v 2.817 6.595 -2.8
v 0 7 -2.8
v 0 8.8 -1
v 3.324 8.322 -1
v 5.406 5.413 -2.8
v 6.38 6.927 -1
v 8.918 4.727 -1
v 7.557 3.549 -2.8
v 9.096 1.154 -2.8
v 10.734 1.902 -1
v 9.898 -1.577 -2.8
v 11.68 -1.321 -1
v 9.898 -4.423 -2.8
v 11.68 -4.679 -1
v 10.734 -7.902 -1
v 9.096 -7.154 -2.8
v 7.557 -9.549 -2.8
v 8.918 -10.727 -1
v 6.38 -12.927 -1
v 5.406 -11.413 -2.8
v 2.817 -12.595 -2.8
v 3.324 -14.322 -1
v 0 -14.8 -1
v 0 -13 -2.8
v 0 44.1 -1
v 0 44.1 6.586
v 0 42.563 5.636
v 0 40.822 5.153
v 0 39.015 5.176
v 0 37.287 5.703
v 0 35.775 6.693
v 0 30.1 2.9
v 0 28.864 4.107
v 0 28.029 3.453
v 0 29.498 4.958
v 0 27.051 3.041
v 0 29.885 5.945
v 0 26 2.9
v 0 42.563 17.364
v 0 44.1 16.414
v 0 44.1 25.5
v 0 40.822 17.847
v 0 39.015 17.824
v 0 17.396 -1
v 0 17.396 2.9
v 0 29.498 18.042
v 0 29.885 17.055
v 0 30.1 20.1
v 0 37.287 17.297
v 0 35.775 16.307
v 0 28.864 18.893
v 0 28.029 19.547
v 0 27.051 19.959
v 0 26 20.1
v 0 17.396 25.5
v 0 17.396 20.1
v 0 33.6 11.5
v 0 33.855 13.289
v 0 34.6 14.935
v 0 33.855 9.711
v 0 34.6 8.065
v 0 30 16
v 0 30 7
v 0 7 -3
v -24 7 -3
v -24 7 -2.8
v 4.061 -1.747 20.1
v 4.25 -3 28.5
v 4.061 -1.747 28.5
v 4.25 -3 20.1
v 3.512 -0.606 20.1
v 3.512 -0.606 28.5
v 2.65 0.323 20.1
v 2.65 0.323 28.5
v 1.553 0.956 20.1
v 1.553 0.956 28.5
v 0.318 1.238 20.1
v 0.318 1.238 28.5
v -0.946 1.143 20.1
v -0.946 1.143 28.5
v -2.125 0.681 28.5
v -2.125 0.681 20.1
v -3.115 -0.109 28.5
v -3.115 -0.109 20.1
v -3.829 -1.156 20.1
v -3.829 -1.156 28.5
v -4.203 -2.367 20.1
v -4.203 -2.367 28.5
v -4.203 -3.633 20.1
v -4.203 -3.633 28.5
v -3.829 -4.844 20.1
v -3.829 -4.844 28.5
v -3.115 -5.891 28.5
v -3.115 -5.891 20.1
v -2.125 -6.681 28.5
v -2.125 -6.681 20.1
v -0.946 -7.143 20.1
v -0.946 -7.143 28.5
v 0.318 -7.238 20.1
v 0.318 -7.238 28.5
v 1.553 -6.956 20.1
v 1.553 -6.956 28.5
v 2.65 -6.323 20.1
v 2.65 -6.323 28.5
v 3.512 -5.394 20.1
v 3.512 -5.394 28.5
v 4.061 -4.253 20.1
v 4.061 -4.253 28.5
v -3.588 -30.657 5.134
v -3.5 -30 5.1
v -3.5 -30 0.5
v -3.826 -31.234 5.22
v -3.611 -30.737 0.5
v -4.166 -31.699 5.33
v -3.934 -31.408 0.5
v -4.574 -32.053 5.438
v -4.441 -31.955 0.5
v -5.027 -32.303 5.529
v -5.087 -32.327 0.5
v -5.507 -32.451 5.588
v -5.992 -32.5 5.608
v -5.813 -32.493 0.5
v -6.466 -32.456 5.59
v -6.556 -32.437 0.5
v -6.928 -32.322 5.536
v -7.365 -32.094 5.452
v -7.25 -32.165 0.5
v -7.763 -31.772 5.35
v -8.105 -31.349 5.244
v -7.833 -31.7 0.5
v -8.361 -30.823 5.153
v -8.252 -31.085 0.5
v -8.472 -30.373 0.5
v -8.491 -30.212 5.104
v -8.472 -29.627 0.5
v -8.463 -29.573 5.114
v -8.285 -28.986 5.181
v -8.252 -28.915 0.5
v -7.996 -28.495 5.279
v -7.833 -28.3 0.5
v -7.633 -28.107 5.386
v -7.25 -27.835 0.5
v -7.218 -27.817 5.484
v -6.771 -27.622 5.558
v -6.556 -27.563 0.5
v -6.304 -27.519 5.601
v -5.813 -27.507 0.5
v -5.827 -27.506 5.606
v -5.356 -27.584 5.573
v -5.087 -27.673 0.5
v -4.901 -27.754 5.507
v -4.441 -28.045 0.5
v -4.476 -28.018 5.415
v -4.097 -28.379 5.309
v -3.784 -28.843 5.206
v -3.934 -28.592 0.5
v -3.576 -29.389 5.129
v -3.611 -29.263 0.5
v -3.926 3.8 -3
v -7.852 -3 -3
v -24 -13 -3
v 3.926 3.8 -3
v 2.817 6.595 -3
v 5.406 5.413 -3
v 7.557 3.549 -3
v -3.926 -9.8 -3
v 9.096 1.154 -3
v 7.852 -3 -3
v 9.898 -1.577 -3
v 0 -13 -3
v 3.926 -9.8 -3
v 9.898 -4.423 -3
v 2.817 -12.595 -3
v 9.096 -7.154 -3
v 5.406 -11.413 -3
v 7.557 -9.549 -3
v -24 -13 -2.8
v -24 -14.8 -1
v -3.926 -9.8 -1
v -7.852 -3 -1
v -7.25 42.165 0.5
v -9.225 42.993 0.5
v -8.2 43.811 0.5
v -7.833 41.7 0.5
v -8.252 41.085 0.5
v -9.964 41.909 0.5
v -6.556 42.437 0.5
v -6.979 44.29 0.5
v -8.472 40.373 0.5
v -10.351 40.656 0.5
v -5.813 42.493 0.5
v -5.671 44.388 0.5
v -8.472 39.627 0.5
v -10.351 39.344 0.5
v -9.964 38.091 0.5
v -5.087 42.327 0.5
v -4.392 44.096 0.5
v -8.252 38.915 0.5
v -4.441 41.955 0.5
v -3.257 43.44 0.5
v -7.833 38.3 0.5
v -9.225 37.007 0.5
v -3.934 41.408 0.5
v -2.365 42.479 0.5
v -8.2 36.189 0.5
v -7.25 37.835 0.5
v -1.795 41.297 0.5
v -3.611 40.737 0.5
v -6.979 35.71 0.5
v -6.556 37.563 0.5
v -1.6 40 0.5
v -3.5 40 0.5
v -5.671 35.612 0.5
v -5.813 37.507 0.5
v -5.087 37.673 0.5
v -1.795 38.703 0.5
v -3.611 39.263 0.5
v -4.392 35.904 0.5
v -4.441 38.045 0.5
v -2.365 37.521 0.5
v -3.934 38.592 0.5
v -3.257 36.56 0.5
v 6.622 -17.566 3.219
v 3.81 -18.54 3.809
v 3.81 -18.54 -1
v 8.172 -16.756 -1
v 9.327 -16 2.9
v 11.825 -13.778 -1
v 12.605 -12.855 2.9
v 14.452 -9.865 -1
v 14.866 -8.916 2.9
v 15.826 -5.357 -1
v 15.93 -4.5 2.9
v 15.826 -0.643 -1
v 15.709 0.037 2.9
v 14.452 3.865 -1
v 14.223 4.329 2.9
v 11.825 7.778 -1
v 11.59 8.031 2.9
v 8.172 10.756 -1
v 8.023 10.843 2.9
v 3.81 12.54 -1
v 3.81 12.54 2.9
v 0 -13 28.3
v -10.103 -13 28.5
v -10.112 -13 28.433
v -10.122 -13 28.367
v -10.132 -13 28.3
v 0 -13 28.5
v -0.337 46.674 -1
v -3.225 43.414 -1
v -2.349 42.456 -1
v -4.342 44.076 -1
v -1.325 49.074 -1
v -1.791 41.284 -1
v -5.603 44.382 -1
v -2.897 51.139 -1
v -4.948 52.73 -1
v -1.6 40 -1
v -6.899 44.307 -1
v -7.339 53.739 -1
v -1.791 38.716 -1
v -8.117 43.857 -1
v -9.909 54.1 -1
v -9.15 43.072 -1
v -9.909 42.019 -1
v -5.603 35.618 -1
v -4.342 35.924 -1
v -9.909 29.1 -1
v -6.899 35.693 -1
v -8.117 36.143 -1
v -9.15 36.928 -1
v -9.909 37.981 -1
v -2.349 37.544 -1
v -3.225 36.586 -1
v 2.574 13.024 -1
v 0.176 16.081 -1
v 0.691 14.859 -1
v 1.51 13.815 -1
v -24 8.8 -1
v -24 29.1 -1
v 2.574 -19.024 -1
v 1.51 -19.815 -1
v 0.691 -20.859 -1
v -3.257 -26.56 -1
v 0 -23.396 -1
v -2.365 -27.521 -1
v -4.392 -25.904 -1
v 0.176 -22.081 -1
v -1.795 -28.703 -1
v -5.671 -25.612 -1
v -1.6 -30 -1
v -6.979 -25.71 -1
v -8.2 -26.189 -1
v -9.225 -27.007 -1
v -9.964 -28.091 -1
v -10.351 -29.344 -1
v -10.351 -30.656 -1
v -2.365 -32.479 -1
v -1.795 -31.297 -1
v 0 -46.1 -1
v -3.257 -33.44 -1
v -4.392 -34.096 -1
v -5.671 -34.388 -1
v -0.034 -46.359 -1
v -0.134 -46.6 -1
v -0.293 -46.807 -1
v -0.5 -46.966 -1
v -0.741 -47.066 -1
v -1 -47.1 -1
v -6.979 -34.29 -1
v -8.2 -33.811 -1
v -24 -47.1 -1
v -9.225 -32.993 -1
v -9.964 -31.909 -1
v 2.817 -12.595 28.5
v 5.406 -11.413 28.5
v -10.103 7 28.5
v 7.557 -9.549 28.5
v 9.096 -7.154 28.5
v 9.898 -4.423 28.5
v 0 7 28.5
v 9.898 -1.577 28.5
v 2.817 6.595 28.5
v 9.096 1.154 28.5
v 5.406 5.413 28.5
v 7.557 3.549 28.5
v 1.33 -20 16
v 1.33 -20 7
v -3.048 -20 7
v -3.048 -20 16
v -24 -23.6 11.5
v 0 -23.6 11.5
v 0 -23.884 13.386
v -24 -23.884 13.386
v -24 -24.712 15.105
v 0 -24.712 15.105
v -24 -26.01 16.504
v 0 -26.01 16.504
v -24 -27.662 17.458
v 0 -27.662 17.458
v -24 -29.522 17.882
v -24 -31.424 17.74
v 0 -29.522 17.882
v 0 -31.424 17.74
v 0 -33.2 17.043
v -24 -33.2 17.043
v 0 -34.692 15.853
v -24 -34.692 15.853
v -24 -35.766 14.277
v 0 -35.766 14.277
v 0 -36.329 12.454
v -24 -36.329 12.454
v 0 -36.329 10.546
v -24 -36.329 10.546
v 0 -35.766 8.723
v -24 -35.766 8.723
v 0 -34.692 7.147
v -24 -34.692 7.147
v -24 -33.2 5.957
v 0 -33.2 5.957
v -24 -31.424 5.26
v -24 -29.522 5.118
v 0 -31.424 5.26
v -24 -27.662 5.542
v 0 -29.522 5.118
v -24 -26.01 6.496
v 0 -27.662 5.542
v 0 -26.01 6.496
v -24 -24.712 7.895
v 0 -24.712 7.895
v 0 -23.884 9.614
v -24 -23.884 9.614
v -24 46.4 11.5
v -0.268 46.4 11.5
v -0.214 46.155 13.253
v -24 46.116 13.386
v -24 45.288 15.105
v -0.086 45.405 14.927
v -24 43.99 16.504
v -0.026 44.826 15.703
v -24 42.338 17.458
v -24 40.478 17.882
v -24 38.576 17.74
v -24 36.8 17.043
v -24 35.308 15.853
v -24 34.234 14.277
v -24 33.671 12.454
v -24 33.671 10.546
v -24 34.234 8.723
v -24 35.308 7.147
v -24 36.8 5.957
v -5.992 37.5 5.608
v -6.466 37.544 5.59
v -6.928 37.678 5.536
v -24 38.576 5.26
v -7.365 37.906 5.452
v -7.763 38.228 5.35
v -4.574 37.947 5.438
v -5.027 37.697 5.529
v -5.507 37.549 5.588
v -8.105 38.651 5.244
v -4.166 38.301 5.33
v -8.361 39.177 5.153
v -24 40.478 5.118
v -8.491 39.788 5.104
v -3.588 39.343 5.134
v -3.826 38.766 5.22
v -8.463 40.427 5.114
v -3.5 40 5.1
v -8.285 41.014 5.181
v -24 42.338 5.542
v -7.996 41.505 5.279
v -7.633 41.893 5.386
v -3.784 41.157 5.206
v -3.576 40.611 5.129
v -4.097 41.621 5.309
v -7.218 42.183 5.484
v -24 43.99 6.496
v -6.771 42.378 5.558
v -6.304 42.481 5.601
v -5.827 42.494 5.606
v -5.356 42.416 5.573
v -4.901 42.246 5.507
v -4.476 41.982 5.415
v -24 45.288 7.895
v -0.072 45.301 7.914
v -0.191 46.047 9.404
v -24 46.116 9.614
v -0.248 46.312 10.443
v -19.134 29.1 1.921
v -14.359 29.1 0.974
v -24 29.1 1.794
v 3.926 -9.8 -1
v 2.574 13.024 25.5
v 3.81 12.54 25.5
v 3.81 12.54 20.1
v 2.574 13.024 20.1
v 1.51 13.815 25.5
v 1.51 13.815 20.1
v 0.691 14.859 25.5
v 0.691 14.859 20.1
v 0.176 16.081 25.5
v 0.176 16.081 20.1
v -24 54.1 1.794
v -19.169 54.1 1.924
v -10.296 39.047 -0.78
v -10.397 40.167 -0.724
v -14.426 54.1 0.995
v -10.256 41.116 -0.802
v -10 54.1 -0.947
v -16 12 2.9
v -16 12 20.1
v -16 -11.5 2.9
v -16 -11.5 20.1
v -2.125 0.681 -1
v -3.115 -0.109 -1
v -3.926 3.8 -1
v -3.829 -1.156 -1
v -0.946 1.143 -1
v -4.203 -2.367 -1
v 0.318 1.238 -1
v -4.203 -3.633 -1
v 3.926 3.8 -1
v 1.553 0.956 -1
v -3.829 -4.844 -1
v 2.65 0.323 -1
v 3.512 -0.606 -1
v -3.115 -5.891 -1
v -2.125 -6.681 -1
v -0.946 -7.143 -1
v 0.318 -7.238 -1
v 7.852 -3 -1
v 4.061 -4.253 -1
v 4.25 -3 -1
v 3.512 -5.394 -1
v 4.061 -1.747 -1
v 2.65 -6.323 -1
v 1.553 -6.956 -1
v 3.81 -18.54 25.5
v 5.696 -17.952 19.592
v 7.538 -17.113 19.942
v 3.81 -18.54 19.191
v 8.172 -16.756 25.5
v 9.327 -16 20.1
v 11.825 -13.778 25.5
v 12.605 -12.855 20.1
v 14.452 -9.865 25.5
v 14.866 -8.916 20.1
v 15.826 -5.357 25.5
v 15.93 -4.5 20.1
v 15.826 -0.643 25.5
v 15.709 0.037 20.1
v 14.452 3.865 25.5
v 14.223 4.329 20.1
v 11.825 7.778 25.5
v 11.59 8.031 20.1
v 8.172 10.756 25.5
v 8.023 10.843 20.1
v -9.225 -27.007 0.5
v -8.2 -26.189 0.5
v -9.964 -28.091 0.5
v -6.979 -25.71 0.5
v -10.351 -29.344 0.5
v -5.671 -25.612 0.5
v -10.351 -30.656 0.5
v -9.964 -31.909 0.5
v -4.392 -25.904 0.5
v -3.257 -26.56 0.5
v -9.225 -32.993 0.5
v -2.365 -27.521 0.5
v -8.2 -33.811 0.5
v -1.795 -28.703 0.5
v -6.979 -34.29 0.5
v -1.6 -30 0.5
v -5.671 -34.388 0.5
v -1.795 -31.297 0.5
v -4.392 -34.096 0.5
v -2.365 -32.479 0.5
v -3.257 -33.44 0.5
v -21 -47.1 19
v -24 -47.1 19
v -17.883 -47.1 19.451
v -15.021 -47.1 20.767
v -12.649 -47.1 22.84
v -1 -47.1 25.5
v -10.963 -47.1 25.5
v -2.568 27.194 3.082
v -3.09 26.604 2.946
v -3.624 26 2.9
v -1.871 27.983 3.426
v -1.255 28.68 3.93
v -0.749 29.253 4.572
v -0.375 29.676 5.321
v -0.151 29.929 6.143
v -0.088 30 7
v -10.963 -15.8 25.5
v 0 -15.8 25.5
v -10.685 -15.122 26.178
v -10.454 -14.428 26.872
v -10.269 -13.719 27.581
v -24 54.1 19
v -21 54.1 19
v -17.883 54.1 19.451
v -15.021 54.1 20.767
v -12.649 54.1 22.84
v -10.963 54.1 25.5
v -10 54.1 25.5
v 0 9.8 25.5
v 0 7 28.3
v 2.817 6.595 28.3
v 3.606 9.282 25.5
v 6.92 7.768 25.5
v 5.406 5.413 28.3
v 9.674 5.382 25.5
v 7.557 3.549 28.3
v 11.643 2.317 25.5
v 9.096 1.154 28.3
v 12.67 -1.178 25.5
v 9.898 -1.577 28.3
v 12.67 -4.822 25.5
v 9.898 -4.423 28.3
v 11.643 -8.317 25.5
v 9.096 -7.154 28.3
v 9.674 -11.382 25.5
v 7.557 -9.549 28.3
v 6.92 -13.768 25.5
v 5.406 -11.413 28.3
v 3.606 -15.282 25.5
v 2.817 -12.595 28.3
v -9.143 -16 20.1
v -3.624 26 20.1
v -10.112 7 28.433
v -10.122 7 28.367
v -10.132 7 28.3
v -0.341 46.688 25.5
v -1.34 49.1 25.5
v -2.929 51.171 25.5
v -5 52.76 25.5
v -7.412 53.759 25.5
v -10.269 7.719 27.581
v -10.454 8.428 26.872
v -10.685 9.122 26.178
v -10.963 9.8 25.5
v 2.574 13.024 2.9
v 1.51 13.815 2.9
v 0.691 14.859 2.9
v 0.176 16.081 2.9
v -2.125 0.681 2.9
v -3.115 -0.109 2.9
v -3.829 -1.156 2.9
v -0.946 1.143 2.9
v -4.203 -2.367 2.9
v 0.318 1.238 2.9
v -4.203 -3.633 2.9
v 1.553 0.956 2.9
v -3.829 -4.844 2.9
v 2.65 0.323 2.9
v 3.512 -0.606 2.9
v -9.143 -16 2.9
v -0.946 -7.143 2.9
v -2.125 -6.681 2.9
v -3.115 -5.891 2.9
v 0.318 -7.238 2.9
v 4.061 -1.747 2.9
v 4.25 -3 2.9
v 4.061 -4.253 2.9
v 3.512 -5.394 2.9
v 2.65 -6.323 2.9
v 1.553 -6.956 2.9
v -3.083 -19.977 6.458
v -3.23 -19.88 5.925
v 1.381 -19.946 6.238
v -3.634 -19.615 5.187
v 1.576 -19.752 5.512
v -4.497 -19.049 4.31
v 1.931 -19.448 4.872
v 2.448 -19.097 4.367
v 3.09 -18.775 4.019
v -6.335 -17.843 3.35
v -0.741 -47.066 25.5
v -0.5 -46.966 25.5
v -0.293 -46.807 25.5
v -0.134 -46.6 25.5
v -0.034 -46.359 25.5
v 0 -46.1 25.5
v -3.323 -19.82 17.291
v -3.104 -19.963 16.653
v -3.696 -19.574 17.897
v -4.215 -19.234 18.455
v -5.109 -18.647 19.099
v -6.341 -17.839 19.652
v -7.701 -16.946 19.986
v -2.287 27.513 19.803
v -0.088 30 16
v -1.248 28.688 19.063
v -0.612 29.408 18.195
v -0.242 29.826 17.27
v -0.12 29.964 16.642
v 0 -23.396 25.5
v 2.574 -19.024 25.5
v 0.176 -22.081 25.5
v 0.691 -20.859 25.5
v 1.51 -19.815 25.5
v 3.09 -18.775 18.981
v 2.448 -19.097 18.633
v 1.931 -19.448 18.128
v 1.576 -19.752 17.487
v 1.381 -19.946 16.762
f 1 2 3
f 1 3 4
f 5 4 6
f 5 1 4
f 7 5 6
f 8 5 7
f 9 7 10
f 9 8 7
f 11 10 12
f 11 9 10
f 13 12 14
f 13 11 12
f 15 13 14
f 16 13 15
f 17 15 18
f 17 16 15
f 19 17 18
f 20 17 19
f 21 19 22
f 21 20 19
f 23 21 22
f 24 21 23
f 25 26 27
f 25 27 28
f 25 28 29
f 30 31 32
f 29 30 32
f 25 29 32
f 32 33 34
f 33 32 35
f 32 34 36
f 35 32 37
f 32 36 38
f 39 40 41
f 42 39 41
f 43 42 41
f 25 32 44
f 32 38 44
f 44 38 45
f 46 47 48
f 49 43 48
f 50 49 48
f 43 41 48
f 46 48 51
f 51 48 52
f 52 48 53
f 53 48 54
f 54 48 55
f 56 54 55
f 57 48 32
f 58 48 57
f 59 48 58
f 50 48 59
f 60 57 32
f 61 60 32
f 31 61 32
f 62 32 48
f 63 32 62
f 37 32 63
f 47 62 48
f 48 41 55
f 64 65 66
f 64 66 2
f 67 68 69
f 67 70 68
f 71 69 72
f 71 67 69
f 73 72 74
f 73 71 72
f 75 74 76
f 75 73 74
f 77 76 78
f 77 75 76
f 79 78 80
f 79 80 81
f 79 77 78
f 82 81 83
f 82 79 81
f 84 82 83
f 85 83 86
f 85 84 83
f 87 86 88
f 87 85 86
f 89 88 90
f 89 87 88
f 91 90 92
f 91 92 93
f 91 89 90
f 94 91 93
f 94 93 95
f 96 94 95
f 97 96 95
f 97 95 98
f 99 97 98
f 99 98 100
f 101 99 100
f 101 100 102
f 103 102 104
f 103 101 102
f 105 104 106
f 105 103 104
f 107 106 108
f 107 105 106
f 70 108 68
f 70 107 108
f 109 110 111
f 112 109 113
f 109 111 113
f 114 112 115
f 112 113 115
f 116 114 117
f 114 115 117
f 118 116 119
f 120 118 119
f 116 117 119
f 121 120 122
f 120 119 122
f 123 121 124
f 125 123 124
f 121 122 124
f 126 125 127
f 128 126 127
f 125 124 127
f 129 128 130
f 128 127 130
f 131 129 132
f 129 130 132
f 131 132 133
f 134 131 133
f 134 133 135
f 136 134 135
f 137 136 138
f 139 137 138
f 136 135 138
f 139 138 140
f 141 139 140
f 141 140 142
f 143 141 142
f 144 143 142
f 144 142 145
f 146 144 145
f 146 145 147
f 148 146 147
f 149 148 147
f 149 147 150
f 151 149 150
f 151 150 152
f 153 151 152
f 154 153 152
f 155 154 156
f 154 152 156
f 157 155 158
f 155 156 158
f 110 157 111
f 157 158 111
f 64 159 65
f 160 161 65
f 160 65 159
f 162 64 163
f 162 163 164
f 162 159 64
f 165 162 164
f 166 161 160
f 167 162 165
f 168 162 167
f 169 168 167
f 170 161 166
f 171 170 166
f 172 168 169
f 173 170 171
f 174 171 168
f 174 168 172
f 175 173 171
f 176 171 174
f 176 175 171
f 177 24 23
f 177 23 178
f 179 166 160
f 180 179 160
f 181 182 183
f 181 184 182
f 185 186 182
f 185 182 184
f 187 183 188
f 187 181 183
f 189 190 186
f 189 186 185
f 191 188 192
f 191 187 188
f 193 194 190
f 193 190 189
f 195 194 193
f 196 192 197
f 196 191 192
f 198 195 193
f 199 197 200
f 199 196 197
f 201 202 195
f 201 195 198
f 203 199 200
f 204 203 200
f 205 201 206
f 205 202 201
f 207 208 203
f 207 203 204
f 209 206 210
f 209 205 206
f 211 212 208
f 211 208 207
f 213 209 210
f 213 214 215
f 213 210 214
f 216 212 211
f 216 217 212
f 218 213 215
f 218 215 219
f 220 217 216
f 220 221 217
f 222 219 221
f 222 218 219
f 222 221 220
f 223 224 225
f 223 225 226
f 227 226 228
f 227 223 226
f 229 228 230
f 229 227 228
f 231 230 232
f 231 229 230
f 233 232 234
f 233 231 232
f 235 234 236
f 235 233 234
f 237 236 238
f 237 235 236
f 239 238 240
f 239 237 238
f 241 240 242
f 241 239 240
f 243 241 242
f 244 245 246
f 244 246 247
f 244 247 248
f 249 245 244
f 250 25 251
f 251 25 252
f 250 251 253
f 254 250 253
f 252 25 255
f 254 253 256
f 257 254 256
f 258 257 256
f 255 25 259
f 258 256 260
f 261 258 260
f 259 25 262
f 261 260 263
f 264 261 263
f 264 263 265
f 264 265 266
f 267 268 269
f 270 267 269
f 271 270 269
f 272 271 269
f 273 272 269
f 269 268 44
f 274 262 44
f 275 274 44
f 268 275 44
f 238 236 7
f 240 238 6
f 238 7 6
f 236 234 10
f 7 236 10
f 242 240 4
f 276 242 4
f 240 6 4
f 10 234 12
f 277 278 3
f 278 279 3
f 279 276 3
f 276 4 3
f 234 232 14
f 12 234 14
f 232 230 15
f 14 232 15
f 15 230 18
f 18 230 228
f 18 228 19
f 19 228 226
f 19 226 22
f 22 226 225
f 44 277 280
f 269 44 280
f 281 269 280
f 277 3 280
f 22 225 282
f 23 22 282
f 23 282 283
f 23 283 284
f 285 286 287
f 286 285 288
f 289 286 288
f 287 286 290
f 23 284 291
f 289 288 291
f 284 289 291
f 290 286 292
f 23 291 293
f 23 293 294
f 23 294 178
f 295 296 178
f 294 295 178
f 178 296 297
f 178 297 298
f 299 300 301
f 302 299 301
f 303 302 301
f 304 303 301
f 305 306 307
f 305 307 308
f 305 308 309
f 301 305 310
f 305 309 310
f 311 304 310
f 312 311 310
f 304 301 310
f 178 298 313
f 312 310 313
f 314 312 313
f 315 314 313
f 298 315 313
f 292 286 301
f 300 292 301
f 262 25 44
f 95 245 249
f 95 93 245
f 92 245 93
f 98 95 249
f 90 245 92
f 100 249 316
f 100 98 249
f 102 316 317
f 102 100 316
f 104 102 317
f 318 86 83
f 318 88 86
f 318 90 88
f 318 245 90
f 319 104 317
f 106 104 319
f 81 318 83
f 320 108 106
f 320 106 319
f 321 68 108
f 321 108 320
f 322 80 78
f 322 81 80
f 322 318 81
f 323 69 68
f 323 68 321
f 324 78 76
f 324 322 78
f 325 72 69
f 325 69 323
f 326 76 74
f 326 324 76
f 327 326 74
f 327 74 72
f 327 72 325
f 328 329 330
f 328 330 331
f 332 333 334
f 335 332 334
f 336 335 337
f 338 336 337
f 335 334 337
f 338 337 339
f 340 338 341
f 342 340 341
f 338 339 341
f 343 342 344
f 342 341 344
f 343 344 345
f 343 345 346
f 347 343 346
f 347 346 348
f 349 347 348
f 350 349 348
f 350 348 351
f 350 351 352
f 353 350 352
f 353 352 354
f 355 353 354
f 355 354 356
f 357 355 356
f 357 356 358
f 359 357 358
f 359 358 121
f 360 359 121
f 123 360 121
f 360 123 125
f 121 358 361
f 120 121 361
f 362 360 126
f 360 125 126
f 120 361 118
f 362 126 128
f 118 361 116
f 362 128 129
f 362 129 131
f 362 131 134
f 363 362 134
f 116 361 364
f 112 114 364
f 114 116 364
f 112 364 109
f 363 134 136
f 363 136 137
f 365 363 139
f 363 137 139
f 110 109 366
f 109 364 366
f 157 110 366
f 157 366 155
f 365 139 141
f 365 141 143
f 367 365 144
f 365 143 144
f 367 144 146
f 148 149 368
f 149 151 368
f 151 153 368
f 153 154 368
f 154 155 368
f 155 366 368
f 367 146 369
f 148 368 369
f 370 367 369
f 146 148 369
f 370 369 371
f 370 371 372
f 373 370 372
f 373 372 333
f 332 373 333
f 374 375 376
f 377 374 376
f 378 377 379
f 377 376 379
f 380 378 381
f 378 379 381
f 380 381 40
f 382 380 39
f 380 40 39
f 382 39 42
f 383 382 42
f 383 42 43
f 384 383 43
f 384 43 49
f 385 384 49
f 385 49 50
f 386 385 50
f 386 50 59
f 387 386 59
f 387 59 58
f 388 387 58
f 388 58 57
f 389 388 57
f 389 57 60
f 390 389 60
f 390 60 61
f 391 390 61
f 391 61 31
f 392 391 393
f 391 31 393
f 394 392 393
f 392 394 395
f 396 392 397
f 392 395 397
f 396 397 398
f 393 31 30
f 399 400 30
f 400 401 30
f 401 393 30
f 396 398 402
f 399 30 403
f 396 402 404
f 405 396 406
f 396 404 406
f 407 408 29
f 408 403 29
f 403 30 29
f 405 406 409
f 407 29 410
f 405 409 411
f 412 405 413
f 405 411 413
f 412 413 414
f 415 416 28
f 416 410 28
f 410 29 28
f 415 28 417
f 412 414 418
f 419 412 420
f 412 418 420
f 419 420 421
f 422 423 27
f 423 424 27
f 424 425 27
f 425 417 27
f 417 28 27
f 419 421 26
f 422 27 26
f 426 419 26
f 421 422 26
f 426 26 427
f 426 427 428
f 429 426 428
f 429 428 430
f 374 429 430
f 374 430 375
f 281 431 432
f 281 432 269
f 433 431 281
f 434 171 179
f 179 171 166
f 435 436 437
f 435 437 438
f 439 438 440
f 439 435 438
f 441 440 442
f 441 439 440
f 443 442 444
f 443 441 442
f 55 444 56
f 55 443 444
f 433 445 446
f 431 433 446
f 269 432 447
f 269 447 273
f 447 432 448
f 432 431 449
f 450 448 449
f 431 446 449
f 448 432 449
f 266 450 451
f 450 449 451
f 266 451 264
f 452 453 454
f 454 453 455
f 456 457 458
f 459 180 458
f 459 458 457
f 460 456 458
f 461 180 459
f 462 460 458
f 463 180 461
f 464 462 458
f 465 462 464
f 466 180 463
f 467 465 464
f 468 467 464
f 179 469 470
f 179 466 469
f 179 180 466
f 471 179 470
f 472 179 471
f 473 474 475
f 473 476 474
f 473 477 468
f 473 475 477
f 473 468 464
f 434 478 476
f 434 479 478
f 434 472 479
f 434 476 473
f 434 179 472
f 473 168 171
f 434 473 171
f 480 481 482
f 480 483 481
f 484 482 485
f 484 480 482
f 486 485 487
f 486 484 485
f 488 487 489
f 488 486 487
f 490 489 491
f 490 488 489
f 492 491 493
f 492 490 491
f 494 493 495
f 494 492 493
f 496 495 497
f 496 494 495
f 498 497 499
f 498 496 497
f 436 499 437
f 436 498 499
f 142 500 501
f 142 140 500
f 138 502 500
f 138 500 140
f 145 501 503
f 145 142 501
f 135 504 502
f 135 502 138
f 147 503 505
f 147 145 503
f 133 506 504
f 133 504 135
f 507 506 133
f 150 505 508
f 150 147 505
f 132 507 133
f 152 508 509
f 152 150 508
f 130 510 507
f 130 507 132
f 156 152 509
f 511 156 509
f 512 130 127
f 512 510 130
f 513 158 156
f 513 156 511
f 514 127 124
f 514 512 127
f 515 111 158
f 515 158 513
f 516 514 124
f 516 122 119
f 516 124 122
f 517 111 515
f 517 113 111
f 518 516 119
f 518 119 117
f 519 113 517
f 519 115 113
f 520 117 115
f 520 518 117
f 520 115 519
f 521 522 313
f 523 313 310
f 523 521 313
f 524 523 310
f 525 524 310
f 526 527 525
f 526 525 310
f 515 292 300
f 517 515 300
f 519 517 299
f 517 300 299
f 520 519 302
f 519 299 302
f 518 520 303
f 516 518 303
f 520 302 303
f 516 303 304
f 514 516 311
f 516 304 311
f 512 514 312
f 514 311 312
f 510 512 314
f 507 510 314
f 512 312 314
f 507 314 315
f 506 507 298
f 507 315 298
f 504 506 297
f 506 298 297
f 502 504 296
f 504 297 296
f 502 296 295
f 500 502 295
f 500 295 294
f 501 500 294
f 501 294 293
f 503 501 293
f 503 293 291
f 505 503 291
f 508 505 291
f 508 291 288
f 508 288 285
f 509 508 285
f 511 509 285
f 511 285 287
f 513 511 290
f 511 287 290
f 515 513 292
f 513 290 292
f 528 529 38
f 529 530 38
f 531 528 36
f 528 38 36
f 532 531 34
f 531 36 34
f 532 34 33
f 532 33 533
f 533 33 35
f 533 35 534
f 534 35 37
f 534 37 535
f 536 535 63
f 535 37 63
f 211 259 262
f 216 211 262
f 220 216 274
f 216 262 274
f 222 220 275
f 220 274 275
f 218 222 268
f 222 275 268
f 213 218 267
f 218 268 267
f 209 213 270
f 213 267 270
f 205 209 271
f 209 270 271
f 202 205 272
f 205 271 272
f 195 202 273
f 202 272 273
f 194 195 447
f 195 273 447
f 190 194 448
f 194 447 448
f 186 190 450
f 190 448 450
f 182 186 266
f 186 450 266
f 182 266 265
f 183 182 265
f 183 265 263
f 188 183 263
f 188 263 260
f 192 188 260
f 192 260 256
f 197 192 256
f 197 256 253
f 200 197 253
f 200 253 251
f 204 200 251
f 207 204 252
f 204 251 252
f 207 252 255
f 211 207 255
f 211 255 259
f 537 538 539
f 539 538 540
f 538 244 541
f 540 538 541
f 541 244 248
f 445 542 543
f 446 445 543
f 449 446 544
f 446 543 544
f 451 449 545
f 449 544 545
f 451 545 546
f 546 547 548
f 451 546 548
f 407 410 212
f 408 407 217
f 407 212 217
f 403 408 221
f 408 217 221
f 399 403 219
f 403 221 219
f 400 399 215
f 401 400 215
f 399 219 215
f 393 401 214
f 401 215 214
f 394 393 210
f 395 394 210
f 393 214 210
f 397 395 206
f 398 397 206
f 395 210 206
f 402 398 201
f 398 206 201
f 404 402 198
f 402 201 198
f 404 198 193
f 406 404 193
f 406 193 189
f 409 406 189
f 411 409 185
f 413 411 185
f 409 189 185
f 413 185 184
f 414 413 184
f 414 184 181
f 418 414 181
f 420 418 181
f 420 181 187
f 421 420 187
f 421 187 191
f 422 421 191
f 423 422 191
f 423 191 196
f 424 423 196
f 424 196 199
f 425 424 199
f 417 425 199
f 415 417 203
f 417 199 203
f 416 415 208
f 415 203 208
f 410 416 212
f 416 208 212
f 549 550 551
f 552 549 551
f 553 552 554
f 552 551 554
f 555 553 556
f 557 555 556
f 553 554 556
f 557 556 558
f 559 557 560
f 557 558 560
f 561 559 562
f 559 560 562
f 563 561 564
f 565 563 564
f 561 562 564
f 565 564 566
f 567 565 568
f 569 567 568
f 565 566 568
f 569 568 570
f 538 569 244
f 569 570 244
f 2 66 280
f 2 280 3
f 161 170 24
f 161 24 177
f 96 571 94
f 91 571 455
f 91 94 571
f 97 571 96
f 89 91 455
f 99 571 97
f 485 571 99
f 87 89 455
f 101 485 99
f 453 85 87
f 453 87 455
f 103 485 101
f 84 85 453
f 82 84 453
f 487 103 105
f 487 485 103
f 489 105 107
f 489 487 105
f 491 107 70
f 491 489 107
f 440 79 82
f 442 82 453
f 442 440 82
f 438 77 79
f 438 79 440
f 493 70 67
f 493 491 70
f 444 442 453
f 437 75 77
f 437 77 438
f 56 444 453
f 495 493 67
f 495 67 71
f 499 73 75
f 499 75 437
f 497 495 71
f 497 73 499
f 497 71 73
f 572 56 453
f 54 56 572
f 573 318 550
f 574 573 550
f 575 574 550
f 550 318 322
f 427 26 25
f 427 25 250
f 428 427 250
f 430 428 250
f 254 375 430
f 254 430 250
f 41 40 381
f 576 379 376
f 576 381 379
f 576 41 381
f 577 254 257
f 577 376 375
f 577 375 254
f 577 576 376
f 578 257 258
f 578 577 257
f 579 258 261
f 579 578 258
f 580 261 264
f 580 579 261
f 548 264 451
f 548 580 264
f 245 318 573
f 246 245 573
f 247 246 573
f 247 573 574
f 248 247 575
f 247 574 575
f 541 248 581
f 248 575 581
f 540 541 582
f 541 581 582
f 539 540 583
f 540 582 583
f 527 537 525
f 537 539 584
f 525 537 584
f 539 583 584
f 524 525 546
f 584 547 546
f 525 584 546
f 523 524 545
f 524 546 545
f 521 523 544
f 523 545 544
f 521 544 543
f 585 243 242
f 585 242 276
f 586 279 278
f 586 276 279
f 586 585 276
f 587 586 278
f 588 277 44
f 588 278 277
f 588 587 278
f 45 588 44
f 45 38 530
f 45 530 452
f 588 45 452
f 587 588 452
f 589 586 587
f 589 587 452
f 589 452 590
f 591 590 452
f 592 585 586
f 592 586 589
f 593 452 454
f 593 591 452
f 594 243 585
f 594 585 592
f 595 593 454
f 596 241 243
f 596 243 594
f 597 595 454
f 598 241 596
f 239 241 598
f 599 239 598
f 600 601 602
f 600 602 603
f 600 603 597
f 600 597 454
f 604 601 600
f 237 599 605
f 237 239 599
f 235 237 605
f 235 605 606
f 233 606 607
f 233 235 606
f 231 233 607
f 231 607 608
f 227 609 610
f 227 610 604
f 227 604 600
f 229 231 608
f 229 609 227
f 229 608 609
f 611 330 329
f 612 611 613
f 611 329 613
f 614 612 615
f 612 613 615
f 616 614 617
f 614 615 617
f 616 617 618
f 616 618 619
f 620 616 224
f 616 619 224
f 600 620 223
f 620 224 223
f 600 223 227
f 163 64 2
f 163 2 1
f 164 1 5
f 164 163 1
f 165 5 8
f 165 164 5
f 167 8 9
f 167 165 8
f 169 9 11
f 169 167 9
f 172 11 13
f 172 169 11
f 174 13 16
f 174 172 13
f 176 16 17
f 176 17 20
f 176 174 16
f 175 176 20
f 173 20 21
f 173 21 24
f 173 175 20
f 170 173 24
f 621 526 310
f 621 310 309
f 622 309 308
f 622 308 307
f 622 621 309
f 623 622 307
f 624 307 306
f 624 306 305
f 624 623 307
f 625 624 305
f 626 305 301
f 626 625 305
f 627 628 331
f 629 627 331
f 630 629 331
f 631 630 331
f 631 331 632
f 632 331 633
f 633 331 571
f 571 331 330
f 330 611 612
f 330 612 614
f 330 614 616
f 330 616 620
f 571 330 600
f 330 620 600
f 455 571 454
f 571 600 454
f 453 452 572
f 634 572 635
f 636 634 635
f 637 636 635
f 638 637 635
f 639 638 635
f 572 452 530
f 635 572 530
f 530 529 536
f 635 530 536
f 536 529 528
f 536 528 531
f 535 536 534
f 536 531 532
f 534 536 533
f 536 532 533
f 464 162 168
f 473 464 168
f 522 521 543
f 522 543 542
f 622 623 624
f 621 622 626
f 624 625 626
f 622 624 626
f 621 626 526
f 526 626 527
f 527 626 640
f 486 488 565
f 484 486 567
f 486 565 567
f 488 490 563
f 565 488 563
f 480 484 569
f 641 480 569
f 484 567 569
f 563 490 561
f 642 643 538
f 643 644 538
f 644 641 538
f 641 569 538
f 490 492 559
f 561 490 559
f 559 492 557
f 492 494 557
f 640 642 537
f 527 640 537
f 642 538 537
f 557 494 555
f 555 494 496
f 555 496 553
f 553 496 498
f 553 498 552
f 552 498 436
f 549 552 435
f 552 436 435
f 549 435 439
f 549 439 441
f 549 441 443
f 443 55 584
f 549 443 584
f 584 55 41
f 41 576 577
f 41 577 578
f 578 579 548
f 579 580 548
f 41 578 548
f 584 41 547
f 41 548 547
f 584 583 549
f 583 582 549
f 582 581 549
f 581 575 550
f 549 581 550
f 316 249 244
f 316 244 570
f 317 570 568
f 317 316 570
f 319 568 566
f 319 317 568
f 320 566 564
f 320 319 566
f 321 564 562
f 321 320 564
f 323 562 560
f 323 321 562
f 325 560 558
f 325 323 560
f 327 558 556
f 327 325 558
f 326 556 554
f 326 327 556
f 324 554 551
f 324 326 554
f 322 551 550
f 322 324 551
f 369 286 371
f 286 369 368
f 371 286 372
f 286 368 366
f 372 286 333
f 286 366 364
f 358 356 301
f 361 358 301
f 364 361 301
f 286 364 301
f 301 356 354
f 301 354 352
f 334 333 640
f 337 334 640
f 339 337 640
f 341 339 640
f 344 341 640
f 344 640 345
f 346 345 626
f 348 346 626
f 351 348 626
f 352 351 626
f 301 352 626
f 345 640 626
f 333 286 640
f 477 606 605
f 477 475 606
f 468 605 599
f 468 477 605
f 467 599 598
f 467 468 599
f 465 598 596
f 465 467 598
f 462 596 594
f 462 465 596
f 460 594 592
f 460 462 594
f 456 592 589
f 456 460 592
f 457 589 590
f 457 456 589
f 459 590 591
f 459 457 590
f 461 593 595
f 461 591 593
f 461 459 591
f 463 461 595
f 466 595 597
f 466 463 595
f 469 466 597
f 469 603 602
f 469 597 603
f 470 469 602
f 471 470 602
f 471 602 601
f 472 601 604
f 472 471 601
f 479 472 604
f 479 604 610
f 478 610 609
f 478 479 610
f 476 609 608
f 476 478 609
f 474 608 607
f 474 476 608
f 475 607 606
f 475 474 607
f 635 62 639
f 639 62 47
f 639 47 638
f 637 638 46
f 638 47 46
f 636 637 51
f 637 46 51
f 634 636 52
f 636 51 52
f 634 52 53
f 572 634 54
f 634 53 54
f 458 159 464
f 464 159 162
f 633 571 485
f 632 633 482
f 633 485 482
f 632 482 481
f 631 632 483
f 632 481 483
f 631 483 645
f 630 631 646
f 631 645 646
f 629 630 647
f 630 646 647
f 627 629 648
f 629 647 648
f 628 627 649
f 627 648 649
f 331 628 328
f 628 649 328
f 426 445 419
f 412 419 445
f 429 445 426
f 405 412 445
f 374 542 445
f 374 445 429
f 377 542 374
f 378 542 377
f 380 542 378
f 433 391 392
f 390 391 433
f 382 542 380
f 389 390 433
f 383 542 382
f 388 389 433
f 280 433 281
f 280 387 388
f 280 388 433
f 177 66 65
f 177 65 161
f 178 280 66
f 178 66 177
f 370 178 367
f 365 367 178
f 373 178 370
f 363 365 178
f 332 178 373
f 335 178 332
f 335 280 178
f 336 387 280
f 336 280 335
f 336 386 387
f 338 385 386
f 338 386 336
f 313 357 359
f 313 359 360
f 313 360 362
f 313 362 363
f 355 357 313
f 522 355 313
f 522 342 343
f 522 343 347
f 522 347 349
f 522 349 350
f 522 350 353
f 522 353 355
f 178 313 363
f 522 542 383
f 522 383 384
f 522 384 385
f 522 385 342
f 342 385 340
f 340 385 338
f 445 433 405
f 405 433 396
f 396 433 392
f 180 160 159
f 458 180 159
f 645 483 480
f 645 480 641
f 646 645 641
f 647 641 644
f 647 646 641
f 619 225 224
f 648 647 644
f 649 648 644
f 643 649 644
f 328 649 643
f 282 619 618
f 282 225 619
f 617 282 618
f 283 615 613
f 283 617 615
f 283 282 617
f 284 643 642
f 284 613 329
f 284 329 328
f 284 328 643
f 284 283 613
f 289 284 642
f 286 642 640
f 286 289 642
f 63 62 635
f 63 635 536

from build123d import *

# Parameters (mm, degrees)
SKETCH_R          = 4.25
PAD_DEPTH         = 28.5
PAD_DEPTH_BACK    = 5
FILLET_R          = 5
SKETCH002_R       = 6.4
POCKET_DEPTH      = 24.001
POCKET_DEPTH_BACK = -16.001
POCKET001_DEPTH   = 3
POCKET002_DEPTH   = 4
POCKET003_DEPTH   = 101.201
POCKET004_DEPTH   = 4
POCKET005_DEPTH   = 16
SKETCH028_R       = 22
POCKET006_DEPTH   = 25
SKETCH031_R       = 2.5
POCKET007_DEPTH   = 9
PAD001_DEPTH      = 17.2
SKETCH038_W       = 50
SKETCH038_H       = 26
POCKET008_DEPTH   = 2
SKETCH039_R       = 4.4
POCKET009_DEPTH   = 1.5
CHAMFER_SIZE      = 1.8
CHAMFER001_SIZE   = 2.8


with BuildPart() as part:
    # Sketch → Pad (new body, two sides)
    with BuildSketch(Plane.XY) as pad_sk:
        with BuildLine():
            ThreePointArc((0, -19), (16, -3), (0, 13))
            Line((0, 44.1), (0, 13))
            ThreePointArc((0, 44.1), (-2.928932, 51.171068), (-10, 54.1))
            Line((-24, 54.1), (-10, 54.1))
            Line((-24, 54.1), (-24, -47.1))
            Line((-24, -47.1), (-1, -47.1))
            ThreePointArc((-1, -47.1), (-0.292893, -46.807107), (0, -46.1))
            Line((0, -19), (0, -46.1))
        make_face()
        with Locations((0, -3)):
            Circle(SKETCH_R, mode=Mode.SUBTRACT)
    extrude(amount=PAD_DEPTH)
    extrude(pad_sk.sketch, amount=-PAD_DEPTH_BACK)

    # Fillet
    fillet_edges = [part.edges().sort_by_distance(p)[0] for p in [
        (0, 13, 11.75),
        (0, -19, 11.75),
    ]]
    fillet(fillet_edges, radius=FILLET_R)

    # Sketch002 → Pocket (cut, two sides)
    with BuildSketch(Plane.YZ) as pocket_sk:
        with Locations((-30, 11.5)):
            Circle(SKETCH002_R)
        with Locations((40, 11.5)):
            Circle(SKETCH002_R)
    extrude(amount=-POCKET_DEPTH, mode=Mode.SUBTRACT)
    extrude(pocket_sk.sketch, amount=-POCKET_DEPTH_BACK, mode=Mode.SUBTRACT)

    # Sketch013 → Pocket001 (cut)
    with BuildSketch(Plane.XY.offset(28.5)):
        with BuildLine():
            ThreePointArc((0, -13), (10, -3), (0, 7))
            Line((-40, 7), (0, 7))
            Line((-40, 7), (-40, 60))
            Line((-40, 60), (30, 60))
            Line((30, 60), (30, -60))
            Line((30, -60), (-40, -60))
            Line((-40, -60), (-40, -13))
            Line((-40, -13), (0, -13))
        make_face()
    extrude(amount=-POCKET001_DEPTH, mode=Mode.SUBTRACT)

    # Sketch024 → Pocket002 (cut)
    with BuildSketch(Plane(origin=(0, 0, -5), x_dir=(1, 0, 0), z_dir=(0, 0, -1))):
        with BuildLine():
            Line((0, 13), (-40, 13))
            Line((-40, 13), (-40, 65))
            Line((-40, 65), (24, 65))
            Line((24, 65), (24, -65))
            Line((24, -65), (-40, -65))
            Line((-40, -7), (-40, -65))
            Line((-40, -7), (0, -7))
            ThreePointArc((0, -7), (10, 3), (0, 13))
        make_face()
    extrude(amount=-POCKET002_DEPTH, mode=Mode.SUBTRACT)

    # Sketch029 → Pocket003 (cut, through all)
    with BuildSketch(Plane(origin=(0, 54.1, 0), x_dir=(-1, 0, 0), z_dir=(0, 1, 0))):
        with BuildLine():
            ThreePointArc((32, 30), (13.221825, 37.778175), (21, 19))
            Line((21, 19), (32, 19))
            Line((32, 30), (32, 19))
        make_face()
    extrude(amount=-POCKET003_DEPTH, mode=Mode.SUBTRACT)

    # Sketch027 → Pocket004 (cut)
    with BuildSketch(Plane(origin=(0, 0, -5), x_dir=(1, 0, 0), z_dir=(0, 0, -1))):
        Polygon((3.925982, 9.8), (-3.925982, 9.8), (-7.851964, 3), (-3.925982, -3.8), (3.925982, -3.8), (7.851964, 3), align=None)
    extrude(amount=-POCKET004_DEPTH, mode=Mode.SUBTRACT)

    # Sketch025 → Pocket005 (cut, symmetric)
    with BuildSketch(Plane.YZ):
        with BuildLine():
            Line((-16, 20.1), (26, 20.1))
            ThreePointArc((30, 16), (28.864001, 18.892928), (26, 20.1))
            Line((30, 16), (30, 7))
            ThreePointArc((26, 2.9), (28.864001, 4.107072), (30, 7))
            Line((26, 2.9), (-16, 2.9))
            ThreePointArc((-20, 7), (-18.864001, 4.107072), (-16, 2.9))
            Line((-20, 7), (-20, 16))
            ThreePointArc((-16, 20.1), (-18.864001, 18.892928), (-20, 16))
        make_face()
    extrude(amount=POCKET005_DEPTH, both=True, mode=Mode.SUBTRACT)

    # Sketch028 → Pocket006 (cut)
    with BuildSketch(Plane(origin=(0, 54.1, 0), x_dir=(-1, 0, 0), z_dir=(0, 1, 0))):
        with Locations((21, -20)):
            Circle(SKETCH028_R)
    extrude(amount=-POCKET006_DEPTH, mode=Mode.SUBTRACT)

    # Sketch031 → Pocket007 (cut)
    with BuildSketch(Plane(origin=(0, 0, -1), x_dir=(1, 0, 0), z_dir=(0, 0, -1))):
        with Locations((-6, 30)):
            Circle(SKETCH031_R)
        with Locations((-6, -40)):
            Circle(SKETCH031_R)
    extrude(amount=-POCKET007_DEPTH, mode=Mode.SUBTRACT)

    # Sketch032 → Pad001 (new body)
    with BuildSketch(Plane.XY.offset(2.9)):
        Polygon((0, -22), (-16, -11.5), (-16, -22), align=None)
        Polygon((-16, 12), (0, 30.1), (-16, 30.1), align=None)
    extrude(amount=PAD001_DEPTH)

    # Sketch038 → Pocket008 (cut)
    with BuildSketch(Plane(origin=(0, 0, -5), x_dir=(1, 0, 0), z_dir=(0, 0, -1))):
        with Locations((-10, 2)):
            Rectangle(SKETCH038_W, SKETCH038_H)
    extrude(amount=-POCKET008_DEPTH, mode=Mode.SUBTRACT)

    # Sketch039 → Pocket009 (cut)
    with BuildSketch(Plane(origin=(0, 0, -1), x_dir=(1, 0, 0), z_dir=(0, 0, -1))):
        with Locations((-6, 30)):
            Circle(SKETCH039_R)
        with Locations((-6, -40)):
            Circle(SKETCH039_R)
    extrude(amount=-POCKET009_DEPTH, mode=Mode.SUBTRACT)

    # Chamfer
    chamfer_edges = [part.edges().sort_by_distance(p)[0] for p in [
        (-12, -13, -1),
        (10, -3, -1),
        (-12, 7, -1),
    ]]
    chamfer(chamfer_edges, length=CHAMFER_SIZE)

    # Chamfer001
    chamfer001_edges = [part.edges().sort_by_distance(p)[0] for p in [
        (-5.481285, 7, 25.5),
        (10, -3, 25.5),
        (-5.481285, -13, 25.5),
    ]]
    chamfer(chamfer001_edges, length=CHAMFER001_SIZE)


solid = part.part
